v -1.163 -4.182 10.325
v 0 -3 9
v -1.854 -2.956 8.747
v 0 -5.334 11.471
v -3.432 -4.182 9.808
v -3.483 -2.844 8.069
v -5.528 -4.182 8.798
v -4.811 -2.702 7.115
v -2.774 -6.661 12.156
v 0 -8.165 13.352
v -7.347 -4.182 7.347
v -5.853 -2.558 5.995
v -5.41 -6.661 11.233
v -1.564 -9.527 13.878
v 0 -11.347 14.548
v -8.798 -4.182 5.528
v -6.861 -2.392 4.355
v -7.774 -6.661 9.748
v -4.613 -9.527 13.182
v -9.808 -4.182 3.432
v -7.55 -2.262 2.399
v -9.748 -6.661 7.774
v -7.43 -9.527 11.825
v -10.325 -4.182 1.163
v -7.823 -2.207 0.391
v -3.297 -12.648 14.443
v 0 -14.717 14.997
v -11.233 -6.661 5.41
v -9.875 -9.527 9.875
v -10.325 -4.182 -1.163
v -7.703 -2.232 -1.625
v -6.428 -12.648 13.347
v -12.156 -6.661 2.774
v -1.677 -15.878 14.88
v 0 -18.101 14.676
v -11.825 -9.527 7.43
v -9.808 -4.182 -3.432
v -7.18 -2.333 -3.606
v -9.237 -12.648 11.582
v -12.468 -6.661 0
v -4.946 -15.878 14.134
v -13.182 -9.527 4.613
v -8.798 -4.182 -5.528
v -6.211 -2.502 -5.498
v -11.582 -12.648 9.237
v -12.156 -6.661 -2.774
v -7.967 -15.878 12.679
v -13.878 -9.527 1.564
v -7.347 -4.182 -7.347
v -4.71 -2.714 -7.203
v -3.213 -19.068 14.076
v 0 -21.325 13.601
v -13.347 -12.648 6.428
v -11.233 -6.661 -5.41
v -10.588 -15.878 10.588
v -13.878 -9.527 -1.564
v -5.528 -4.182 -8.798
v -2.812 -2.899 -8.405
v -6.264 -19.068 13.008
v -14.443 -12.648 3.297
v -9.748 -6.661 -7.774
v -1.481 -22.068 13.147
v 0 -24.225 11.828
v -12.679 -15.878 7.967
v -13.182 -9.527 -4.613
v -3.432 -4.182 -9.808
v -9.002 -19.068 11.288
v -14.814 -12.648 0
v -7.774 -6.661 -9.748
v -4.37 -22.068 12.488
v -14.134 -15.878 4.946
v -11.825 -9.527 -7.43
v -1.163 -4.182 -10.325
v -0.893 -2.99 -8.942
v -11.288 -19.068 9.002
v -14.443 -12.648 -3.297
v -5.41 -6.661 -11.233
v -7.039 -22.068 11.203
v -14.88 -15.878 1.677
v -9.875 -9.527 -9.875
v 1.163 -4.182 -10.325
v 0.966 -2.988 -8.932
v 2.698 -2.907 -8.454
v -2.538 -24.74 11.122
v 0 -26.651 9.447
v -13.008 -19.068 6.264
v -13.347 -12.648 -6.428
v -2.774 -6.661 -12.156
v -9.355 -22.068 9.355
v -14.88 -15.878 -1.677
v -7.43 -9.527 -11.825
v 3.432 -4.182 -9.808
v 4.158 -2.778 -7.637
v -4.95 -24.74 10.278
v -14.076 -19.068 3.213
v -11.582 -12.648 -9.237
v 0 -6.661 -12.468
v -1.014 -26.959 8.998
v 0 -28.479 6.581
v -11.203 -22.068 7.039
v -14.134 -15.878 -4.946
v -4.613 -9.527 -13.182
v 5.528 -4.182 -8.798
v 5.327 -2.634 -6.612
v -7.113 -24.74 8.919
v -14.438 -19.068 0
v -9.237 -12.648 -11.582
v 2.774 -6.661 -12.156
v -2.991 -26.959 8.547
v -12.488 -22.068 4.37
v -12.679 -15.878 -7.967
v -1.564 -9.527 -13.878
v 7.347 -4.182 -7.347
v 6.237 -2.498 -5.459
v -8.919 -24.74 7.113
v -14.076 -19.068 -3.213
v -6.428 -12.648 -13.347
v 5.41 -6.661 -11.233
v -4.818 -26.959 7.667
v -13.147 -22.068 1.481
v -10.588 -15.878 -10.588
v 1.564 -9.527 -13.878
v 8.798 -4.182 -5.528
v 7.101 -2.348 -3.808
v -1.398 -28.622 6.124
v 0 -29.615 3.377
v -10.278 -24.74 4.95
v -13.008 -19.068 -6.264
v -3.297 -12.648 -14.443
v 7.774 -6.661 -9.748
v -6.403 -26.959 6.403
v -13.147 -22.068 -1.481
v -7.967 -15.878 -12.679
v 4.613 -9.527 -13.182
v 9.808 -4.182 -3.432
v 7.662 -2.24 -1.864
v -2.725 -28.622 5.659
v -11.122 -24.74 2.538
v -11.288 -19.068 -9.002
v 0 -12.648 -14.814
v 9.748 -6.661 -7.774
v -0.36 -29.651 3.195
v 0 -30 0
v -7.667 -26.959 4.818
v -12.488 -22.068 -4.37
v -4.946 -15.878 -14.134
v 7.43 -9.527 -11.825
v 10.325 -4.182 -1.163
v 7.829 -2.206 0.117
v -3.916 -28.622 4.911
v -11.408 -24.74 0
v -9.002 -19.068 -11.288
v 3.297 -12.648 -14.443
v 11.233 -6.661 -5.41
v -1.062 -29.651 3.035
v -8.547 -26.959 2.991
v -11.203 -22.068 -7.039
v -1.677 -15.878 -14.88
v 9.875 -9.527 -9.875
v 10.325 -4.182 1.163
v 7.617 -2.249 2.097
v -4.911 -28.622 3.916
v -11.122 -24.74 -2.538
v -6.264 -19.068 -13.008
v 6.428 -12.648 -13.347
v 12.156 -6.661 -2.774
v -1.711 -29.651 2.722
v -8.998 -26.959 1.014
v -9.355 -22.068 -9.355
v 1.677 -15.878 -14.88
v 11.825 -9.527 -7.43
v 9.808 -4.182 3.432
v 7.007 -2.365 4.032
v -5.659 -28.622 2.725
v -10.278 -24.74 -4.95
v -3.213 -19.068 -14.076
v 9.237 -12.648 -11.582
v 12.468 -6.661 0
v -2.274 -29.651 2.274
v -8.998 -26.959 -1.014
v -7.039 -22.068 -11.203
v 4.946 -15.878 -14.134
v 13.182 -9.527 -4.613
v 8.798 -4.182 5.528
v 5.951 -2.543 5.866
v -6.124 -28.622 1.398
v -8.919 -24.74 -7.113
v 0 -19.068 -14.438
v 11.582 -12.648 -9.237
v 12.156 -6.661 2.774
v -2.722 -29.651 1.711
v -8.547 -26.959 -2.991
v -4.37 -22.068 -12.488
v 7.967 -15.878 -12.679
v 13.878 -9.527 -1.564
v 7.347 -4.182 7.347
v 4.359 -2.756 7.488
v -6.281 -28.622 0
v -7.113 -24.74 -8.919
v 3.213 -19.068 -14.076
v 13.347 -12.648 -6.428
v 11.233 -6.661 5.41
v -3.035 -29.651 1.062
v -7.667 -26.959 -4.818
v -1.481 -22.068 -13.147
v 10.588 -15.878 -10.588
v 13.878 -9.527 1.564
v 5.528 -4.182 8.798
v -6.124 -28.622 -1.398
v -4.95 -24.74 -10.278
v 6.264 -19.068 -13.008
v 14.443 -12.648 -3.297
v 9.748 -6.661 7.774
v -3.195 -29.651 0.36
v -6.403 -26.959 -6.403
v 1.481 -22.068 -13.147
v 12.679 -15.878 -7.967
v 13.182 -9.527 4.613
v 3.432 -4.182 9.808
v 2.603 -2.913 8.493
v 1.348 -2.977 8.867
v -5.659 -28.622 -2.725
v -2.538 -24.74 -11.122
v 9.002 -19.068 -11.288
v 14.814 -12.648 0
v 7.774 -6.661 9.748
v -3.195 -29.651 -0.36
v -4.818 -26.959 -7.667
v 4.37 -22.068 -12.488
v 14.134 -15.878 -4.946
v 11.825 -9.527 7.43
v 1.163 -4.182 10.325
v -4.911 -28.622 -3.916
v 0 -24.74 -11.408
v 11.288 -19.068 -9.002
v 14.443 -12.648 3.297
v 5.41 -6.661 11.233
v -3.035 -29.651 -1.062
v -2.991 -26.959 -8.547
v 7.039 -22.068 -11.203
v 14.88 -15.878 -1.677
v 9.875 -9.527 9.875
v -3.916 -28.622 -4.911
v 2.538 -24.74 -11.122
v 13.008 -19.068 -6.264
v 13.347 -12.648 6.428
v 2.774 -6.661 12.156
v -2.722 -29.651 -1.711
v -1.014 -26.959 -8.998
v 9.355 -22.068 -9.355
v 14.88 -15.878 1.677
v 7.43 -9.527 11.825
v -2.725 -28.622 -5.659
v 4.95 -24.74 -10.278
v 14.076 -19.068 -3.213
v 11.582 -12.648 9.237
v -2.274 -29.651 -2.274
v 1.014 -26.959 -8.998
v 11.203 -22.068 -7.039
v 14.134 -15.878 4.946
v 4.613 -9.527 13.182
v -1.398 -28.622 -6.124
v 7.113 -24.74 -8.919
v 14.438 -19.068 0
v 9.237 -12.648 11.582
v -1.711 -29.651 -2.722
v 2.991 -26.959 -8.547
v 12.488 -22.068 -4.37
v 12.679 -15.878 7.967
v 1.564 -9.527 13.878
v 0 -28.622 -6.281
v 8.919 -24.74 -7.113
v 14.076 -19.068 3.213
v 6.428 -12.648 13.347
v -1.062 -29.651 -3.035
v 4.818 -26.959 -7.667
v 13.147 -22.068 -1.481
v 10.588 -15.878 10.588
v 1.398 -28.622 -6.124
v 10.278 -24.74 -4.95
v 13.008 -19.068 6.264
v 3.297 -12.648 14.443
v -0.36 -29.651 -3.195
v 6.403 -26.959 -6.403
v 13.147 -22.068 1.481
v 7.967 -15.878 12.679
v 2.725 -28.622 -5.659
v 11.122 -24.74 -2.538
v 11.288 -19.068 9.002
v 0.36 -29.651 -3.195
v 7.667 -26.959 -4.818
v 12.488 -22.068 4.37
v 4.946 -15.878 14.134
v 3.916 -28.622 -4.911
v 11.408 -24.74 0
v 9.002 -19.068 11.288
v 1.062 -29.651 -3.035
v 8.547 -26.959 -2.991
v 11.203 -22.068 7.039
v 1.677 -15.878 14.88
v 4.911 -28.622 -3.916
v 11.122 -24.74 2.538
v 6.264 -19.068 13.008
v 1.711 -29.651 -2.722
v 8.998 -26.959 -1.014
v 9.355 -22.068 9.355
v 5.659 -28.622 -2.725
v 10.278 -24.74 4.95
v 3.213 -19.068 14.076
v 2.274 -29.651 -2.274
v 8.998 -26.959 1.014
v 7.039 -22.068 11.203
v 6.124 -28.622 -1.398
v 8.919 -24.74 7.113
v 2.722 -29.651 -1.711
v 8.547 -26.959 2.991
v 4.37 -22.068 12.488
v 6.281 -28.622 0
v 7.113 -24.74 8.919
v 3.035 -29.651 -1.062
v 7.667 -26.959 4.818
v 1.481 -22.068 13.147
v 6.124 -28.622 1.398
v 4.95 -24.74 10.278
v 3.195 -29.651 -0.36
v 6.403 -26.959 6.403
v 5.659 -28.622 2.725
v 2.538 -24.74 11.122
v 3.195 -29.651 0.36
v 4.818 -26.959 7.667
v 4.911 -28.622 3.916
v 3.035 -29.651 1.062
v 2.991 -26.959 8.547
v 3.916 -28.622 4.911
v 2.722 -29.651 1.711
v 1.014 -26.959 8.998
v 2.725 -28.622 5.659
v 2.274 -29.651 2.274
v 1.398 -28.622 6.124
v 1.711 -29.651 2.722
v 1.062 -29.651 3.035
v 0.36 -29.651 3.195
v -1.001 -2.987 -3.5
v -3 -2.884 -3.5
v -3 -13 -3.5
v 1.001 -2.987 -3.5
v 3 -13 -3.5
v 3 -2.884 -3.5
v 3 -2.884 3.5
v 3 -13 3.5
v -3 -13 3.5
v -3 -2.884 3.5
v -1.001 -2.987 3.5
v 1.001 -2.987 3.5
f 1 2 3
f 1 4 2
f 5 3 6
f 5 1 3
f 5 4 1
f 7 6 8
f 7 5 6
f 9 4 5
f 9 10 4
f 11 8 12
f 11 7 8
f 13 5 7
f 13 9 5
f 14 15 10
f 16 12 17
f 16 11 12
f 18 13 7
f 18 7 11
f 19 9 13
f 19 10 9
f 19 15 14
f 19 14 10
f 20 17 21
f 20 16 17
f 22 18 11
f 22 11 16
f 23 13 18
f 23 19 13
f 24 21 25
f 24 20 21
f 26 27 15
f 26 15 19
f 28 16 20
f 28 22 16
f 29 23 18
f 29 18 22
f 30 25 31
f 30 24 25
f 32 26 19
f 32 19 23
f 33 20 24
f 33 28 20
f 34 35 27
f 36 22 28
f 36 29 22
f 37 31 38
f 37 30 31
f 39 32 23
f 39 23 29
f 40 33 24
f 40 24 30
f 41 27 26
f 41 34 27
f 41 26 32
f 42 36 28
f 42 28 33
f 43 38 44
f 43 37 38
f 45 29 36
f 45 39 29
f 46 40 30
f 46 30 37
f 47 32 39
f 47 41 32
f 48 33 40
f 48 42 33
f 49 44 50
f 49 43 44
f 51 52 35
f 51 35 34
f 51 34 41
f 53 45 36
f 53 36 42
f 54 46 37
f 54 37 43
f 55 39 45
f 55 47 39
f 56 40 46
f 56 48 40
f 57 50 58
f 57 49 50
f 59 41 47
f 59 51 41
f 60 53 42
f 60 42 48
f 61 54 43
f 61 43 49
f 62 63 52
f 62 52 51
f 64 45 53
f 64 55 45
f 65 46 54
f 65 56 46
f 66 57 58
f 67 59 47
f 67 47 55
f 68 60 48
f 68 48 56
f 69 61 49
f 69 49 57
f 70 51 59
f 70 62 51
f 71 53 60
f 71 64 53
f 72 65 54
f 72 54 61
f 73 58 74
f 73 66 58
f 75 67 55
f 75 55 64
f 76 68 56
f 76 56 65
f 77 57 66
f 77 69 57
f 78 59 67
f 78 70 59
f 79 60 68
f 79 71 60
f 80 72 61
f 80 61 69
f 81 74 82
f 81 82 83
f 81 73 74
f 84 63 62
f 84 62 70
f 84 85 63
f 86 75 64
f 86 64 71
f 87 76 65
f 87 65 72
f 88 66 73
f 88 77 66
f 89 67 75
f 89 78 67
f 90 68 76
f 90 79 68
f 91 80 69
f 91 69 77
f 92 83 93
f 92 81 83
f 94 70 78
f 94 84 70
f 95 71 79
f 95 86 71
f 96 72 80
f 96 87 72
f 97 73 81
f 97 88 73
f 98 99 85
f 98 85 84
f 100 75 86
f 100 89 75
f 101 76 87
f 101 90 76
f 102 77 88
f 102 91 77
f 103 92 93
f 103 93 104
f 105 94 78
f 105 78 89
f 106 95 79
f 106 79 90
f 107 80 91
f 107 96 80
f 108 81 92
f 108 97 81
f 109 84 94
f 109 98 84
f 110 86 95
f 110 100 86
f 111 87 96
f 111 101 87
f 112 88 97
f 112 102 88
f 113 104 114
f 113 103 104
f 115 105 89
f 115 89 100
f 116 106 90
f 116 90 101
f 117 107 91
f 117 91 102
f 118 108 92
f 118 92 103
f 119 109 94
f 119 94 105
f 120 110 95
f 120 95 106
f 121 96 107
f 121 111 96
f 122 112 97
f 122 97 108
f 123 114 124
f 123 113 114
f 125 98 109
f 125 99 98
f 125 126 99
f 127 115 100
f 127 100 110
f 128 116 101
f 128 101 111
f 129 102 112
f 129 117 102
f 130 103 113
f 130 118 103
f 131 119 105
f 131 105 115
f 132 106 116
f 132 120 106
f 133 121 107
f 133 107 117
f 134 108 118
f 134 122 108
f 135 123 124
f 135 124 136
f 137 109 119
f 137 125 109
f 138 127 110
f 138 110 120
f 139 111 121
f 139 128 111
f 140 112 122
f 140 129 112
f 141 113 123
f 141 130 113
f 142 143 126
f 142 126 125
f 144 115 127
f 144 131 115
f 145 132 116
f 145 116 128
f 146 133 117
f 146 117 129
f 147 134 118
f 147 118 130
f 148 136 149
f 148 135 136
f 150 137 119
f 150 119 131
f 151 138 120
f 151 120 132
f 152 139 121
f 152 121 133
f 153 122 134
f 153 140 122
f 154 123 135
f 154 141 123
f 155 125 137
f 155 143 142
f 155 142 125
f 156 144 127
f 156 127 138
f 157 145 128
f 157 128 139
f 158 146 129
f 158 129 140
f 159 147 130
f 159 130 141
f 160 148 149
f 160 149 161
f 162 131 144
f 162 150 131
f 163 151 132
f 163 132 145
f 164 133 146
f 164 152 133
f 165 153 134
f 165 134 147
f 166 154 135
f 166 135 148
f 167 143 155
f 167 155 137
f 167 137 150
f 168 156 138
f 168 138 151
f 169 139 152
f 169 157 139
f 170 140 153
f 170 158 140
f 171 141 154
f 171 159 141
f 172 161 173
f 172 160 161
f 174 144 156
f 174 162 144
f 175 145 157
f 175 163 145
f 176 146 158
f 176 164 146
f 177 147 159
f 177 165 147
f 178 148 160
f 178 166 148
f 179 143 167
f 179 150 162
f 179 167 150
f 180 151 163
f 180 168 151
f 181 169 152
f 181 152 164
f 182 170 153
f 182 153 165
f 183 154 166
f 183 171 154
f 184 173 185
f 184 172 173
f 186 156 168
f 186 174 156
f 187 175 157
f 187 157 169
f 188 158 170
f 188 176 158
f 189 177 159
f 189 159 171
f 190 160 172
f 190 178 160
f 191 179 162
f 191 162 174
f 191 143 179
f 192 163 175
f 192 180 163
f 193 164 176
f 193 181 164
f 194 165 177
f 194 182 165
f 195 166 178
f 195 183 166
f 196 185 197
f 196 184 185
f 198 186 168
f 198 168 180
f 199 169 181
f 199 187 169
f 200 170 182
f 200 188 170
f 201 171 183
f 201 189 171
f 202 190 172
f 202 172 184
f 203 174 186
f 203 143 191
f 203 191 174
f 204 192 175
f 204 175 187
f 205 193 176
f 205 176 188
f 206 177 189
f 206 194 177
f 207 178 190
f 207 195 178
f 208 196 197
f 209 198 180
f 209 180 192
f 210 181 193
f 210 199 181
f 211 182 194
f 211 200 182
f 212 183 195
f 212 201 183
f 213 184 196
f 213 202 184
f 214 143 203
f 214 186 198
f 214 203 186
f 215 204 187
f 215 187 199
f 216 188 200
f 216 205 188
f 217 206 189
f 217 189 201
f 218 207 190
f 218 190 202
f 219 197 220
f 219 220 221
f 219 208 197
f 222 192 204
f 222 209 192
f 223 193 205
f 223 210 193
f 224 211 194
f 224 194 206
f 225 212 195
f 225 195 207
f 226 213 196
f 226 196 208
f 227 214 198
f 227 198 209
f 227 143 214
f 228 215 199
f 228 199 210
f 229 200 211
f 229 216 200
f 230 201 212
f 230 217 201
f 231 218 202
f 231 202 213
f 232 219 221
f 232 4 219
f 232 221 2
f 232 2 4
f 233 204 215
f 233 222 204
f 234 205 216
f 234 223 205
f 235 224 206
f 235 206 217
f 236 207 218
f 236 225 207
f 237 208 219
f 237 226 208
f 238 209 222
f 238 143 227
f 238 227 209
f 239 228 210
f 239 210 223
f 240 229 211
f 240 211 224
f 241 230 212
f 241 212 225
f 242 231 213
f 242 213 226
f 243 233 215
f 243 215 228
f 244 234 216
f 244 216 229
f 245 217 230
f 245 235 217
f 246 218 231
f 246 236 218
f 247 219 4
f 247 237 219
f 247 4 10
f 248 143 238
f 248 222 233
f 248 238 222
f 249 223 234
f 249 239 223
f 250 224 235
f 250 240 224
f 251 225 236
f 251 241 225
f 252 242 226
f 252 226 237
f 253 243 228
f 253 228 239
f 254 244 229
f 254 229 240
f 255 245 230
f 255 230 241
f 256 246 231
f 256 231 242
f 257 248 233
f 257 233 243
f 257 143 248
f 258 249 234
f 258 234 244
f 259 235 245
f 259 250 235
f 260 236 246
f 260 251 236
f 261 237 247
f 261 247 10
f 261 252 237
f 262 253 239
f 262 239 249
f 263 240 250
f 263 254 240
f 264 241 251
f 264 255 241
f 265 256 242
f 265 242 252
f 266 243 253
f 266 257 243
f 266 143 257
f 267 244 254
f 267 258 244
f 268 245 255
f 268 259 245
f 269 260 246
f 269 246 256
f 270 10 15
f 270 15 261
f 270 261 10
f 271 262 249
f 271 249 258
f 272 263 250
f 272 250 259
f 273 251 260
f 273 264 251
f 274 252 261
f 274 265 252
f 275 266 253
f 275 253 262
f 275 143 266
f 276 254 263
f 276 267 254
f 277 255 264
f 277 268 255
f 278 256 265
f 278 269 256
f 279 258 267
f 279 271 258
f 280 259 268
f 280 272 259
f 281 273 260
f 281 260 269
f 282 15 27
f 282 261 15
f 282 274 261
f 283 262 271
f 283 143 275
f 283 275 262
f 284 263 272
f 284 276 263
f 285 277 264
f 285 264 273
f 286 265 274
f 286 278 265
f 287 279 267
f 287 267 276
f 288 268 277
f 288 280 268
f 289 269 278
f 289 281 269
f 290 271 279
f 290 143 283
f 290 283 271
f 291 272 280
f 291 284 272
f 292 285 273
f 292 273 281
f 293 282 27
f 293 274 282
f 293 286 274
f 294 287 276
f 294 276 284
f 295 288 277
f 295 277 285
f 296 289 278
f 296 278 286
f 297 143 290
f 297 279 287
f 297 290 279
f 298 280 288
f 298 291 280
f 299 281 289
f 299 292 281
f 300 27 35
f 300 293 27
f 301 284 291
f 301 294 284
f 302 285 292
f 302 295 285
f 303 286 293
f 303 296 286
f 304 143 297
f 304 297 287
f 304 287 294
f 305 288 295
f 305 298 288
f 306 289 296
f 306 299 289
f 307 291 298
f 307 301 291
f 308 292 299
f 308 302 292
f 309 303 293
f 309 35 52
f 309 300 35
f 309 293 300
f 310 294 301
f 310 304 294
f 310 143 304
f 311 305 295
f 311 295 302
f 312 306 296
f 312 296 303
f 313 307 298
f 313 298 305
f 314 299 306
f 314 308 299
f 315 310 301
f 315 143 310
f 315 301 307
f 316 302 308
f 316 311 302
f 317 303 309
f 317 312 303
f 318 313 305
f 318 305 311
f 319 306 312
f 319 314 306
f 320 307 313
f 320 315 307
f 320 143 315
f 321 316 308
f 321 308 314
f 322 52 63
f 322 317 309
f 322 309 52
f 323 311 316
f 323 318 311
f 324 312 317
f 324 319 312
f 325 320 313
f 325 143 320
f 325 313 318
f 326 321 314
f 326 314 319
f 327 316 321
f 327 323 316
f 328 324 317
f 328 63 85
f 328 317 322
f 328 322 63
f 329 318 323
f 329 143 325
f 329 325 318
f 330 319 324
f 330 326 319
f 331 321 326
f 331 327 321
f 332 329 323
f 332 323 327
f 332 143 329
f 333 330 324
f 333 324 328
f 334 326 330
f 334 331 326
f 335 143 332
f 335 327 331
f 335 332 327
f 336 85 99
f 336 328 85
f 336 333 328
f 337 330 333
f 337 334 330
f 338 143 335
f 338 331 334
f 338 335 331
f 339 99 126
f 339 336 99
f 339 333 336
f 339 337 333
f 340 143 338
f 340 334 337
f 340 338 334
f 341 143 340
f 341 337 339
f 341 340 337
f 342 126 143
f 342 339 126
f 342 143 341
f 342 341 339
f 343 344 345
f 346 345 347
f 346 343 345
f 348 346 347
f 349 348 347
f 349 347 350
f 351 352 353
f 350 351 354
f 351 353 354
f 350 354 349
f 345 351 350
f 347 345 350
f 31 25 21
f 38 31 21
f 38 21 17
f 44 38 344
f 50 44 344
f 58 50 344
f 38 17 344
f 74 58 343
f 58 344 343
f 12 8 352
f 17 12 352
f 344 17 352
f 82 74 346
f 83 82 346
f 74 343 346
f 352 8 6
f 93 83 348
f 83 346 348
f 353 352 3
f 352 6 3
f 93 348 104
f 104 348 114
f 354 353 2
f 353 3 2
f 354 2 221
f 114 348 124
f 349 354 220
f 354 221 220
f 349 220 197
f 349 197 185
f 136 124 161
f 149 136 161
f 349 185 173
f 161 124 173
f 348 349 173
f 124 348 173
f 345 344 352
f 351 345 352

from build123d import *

# Parameters (mm, degrees)
F4_DEPTH = 30.001
F5_W     = 6
F5_H     = 7
F6_DEPTH = 13


with BuildPart() as f1:
    # F0 (on Right) → F1 (revolve)
    with BuildSketch(Plane.YZ):
        with BuildLine():
            Line((-30, 0), (0, 0))
            ThreePointArc((0, 0), (-15, 15), (-30, 0))
        make_face()
    revolve(axis=Axis((0, -15, 0), (0, -1, 0)))

    # F3 (on offset) → F4 (cut, through all)
    with BuildSketch(Plane.XY.offset(15)):
        with BuildLine():
            Line((15, 0), (0, 0))
            Line((0, 0), (-15, 0))
            ThreePointArc((-15, 0), (0, -3), (15, 0))
        make_face()
    extrude(amount=-F4_DEPTH, mode=Mode.SUBTRACT)

    # F5 (on Front) → F6 (cut)
    with BuildSketch(Plane.XZ):
        Rectangle(F5_W, F5_H)
    extrude(amount=F6_DEPTH, mode=Mode.SUBTRACT)


solid = f1.part
